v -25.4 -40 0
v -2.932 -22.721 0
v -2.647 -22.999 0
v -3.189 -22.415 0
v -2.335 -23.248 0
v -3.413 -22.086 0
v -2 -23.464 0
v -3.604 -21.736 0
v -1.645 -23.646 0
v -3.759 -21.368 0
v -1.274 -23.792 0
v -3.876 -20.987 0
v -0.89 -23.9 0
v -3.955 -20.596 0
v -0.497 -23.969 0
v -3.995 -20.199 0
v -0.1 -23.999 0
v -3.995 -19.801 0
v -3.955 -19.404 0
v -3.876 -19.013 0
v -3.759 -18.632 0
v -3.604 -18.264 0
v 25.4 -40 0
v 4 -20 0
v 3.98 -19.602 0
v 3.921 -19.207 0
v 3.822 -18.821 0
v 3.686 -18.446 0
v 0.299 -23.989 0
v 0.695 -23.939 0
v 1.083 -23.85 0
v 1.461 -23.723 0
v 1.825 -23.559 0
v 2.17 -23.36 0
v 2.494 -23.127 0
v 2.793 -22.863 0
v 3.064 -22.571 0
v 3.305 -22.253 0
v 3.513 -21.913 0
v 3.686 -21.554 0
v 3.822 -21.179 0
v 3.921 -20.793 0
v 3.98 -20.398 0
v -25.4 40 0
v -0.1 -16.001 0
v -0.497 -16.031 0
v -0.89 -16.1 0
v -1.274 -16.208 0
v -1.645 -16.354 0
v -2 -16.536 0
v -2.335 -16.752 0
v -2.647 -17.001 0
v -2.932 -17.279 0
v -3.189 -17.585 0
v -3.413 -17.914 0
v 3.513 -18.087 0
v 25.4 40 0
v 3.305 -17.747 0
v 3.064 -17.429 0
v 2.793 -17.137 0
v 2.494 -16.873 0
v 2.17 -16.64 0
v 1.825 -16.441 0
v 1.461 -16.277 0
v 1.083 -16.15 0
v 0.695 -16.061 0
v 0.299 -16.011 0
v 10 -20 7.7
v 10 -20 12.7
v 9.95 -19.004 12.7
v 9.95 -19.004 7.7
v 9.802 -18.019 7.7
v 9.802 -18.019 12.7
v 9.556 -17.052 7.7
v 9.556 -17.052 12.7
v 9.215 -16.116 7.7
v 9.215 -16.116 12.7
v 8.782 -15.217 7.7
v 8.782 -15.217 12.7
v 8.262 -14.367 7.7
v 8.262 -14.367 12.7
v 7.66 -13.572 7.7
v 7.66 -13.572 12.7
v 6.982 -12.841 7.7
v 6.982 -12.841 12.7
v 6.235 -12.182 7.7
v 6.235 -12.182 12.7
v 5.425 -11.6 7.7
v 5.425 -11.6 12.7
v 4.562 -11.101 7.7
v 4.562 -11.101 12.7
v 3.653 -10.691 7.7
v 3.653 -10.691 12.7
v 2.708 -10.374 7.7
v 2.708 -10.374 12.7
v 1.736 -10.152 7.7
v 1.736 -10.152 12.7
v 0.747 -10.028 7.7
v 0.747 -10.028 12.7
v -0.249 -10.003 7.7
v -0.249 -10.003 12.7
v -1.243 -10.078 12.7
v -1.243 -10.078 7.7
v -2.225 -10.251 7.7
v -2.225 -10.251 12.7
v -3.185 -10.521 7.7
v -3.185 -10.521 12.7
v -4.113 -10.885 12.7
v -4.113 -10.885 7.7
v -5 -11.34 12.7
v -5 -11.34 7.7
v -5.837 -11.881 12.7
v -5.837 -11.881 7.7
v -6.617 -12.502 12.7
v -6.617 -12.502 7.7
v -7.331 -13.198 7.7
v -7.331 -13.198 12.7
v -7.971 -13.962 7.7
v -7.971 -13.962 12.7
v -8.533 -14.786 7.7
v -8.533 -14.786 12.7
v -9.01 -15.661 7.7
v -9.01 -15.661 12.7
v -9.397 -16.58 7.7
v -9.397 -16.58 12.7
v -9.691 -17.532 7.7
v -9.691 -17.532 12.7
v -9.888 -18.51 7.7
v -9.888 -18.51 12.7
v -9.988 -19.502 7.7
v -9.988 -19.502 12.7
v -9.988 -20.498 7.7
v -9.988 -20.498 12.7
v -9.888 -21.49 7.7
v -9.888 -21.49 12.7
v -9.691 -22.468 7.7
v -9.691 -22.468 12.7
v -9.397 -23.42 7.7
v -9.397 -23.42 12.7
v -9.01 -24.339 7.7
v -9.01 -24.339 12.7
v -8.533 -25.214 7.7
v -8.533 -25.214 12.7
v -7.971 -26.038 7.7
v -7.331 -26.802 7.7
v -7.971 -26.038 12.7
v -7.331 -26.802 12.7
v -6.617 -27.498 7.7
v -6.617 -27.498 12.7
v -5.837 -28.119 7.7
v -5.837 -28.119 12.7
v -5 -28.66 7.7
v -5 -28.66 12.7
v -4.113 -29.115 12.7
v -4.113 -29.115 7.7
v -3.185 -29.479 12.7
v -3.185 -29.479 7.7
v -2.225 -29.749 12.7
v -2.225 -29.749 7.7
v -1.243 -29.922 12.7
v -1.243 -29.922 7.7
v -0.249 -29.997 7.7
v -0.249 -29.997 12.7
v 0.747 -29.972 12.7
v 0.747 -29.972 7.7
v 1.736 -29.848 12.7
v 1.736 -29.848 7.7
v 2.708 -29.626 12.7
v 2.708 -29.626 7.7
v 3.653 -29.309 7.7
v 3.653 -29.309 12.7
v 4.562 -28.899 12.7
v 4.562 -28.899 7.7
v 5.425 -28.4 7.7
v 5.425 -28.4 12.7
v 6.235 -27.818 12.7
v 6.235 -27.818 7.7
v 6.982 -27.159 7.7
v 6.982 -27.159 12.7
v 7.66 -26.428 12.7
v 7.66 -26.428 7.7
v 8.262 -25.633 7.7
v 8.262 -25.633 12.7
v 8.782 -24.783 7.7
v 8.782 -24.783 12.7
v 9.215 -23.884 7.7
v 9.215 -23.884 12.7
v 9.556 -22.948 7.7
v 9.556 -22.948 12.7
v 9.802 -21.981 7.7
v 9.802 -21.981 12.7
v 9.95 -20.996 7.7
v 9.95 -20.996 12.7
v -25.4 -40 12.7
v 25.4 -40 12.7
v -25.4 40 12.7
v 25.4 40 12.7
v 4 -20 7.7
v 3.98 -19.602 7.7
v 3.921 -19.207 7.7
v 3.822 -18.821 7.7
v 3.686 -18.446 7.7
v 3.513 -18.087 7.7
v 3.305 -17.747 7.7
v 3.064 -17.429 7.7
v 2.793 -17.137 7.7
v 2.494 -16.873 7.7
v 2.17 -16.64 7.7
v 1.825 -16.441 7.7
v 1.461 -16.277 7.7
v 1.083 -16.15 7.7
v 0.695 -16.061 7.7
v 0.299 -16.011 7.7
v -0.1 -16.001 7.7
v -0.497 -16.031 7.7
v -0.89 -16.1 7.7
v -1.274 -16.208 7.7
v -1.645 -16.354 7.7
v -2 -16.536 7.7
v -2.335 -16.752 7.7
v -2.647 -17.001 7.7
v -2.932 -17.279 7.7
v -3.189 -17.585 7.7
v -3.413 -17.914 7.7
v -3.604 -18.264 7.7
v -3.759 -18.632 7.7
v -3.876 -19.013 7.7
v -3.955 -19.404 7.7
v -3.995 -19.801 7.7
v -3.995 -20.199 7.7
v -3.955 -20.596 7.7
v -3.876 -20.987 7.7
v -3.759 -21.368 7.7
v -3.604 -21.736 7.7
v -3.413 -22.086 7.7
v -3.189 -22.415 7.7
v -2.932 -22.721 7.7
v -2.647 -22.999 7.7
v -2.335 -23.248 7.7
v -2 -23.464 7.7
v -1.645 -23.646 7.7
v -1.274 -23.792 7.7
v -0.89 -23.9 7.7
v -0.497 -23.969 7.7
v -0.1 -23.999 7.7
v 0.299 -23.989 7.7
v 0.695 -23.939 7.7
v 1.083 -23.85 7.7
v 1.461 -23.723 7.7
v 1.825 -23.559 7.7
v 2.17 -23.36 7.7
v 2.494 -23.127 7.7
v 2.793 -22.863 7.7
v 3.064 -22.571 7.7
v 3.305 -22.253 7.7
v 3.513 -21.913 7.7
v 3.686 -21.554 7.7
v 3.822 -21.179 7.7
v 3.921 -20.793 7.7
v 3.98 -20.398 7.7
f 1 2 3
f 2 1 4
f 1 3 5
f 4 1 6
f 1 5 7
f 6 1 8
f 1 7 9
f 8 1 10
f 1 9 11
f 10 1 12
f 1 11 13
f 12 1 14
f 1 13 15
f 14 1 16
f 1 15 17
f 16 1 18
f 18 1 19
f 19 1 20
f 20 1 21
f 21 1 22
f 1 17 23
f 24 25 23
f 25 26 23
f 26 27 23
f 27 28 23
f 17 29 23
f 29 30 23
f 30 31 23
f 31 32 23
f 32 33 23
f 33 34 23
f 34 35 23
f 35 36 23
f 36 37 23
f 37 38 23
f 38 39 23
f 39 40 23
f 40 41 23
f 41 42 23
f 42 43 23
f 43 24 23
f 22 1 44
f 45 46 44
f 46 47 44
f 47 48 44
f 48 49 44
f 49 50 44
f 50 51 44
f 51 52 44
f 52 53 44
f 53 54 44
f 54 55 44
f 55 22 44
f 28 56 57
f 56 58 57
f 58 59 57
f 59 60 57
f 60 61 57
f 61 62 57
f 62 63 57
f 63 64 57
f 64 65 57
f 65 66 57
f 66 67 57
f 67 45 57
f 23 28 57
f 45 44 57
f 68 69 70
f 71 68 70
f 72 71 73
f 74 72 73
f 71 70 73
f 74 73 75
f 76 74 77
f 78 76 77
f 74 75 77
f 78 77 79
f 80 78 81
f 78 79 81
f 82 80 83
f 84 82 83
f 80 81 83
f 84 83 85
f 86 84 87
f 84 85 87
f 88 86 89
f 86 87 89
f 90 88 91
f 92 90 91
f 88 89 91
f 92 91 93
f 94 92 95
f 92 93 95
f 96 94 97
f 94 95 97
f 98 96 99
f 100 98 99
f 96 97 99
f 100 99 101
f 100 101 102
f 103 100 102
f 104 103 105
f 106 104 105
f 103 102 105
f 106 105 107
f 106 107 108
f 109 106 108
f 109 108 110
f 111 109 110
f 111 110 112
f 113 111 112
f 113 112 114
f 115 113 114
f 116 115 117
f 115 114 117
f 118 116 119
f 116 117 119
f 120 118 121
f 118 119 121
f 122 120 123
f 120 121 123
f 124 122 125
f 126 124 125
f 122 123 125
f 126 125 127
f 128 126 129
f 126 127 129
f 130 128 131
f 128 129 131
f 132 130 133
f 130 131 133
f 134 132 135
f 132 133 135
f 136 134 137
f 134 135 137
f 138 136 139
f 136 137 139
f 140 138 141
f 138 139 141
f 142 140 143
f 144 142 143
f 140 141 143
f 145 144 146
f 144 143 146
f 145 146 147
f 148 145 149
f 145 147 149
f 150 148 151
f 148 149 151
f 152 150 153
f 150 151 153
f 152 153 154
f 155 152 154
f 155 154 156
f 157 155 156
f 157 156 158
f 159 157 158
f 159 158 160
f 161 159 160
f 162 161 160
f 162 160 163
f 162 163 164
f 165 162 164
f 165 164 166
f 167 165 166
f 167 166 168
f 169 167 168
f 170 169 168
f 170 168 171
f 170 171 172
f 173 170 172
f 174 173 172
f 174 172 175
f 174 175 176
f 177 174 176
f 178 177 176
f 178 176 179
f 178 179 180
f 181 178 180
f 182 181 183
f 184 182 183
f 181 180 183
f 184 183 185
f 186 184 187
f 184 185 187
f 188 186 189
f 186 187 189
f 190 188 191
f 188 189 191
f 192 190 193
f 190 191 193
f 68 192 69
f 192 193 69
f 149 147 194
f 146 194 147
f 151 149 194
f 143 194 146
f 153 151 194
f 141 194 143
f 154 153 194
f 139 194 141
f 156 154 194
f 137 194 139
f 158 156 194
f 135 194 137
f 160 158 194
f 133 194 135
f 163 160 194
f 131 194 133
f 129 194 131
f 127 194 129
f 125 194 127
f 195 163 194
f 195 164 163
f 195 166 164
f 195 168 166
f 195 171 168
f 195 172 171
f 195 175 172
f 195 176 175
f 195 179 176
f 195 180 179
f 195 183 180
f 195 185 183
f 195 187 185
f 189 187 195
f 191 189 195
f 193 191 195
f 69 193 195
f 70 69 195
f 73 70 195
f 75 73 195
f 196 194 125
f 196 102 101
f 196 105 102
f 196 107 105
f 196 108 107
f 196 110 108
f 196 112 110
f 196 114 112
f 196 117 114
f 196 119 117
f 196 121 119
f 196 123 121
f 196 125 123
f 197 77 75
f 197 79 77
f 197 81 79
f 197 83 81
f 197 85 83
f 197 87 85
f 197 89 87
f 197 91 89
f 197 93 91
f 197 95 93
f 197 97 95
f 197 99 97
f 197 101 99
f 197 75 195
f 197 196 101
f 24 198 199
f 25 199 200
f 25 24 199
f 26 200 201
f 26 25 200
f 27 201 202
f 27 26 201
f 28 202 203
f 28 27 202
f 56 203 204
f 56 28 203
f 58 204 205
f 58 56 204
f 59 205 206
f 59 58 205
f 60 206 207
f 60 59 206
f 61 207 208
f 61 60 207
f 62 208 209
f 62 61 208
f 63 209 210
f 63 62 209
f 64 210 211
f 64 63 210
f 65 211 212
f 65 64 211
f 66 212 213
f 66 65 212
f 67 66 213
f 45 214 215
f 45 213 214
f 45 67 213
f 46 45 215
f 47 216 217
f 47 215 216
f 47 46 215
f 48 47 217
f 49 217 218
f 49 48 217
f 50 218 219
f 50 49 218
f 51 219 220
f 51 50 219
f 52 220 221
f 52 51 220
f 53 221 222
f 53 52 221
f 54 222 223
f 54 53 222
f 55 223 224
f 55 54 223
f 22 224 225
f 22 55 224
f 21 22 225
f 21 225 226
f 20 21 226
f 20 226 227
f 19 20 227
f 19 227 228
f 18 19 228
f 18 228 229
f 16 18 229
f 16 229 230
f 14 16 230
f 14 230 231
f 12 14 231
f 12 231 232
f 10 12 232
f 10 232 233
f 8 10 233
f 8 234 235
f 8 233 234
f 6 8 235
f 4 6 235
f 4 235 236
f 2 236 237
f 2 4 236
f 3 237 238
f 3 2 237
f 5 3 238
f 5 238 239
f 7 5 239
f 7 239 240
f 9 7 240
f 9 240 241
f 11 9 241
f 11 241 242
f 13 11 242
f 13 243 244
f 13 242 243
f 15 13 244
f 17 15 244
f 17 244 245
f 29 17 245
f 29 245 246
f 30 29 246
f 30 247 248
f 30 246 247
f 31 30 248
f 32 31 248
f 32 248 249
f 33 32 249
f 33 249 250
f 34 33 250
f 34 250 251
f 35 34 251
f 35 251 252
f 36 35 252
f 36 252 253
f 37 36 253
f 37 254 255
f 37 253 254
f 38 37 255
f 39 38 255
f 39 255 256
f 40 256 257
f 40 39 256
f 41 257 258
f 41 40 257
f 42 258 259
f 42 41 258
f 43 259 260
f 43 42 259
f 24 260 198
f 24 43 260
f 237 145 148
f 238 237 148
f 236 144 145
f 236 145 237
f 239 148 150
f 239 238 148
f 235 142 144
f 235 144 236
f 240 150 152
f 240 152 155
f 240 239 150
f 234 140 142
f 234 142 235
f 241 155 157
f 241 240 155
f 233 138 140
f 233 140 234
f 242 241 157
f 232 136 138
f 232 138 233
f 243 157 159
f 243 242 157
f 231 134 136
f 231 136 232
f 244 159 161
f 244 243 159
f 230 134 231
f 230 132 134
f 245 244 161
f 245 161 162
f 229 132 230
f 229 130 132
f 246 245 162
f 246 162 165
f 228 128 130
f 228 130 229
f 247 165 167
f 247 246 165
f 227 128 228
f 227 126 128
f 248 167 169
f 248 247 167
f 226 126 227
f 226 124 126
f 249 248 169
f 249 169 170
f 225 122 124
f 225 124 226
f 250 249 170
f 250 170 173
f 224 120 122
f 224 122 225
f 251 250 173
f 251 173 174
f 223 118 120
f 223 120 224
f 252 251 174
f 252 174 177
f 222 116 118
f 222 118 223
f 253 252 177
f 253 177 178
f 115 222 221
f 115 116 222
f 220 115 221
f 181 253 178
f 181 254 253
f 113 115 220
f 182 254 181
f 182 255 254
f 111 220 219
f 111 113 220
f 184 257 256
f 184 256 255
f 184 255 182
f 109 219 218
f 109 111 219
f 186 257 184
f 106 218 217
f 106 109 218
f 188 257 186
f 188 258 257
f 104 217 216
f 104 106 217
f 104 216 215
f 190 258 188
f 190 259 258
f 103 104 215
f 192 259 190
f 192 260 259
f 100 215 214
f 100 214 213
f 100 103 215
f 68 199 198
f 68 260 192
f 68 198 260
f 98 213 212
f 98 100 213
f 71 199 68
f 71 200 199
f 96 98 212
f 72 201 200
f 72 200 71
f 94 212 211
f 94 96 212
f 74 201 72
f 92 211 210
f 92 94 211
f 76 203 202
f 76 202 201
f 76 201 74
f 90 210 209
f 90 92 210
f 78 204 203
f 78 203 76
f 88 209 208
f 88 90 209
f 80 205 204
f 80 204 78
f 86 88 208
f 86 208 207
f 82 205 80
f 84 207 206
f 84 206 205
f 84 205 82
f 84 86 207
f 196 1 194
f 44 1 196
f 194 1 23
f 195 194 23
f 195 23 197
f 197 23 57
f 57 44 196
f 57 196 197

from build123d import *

# Parameters (mm, degrees)
CROQUIS1_W              = 50.8
CROQUIS1_H              = 80
CROQUIS1_R              = 4
SALIENTE_EXTRUIR1_DEPTH = 12.7
CROQUIS2_R              = 10
CORTAR_EXTRUIR1_DEPTH   = 5


with BuildPart() as part:
    # Croquis1 → Saliente-Extruir1 (new body)
    with BuildSketch(Plane.XY):
        Rectangle(CROQUIS1_W, CROQUIS1_H)
        with Locations((0, -20)):
            Circle(CROQUIS1_R, mode=Mode.SUBTRACT)
    extrude(amount=SALIENTE_EXTRUIR1_DEPTH)

    # Croquis2 → Cortar-Extruir1 (cut)
    with BuildSketch(Plane.XY.offset(12.7)):
        with Locations((0, -20)):
            Circle(CROQUIS2_R)
    extrude(amount=-CORTAR_EXTRUIR1_DEPTH, mode=Mode.SUBTRACT)


solid = part.part
